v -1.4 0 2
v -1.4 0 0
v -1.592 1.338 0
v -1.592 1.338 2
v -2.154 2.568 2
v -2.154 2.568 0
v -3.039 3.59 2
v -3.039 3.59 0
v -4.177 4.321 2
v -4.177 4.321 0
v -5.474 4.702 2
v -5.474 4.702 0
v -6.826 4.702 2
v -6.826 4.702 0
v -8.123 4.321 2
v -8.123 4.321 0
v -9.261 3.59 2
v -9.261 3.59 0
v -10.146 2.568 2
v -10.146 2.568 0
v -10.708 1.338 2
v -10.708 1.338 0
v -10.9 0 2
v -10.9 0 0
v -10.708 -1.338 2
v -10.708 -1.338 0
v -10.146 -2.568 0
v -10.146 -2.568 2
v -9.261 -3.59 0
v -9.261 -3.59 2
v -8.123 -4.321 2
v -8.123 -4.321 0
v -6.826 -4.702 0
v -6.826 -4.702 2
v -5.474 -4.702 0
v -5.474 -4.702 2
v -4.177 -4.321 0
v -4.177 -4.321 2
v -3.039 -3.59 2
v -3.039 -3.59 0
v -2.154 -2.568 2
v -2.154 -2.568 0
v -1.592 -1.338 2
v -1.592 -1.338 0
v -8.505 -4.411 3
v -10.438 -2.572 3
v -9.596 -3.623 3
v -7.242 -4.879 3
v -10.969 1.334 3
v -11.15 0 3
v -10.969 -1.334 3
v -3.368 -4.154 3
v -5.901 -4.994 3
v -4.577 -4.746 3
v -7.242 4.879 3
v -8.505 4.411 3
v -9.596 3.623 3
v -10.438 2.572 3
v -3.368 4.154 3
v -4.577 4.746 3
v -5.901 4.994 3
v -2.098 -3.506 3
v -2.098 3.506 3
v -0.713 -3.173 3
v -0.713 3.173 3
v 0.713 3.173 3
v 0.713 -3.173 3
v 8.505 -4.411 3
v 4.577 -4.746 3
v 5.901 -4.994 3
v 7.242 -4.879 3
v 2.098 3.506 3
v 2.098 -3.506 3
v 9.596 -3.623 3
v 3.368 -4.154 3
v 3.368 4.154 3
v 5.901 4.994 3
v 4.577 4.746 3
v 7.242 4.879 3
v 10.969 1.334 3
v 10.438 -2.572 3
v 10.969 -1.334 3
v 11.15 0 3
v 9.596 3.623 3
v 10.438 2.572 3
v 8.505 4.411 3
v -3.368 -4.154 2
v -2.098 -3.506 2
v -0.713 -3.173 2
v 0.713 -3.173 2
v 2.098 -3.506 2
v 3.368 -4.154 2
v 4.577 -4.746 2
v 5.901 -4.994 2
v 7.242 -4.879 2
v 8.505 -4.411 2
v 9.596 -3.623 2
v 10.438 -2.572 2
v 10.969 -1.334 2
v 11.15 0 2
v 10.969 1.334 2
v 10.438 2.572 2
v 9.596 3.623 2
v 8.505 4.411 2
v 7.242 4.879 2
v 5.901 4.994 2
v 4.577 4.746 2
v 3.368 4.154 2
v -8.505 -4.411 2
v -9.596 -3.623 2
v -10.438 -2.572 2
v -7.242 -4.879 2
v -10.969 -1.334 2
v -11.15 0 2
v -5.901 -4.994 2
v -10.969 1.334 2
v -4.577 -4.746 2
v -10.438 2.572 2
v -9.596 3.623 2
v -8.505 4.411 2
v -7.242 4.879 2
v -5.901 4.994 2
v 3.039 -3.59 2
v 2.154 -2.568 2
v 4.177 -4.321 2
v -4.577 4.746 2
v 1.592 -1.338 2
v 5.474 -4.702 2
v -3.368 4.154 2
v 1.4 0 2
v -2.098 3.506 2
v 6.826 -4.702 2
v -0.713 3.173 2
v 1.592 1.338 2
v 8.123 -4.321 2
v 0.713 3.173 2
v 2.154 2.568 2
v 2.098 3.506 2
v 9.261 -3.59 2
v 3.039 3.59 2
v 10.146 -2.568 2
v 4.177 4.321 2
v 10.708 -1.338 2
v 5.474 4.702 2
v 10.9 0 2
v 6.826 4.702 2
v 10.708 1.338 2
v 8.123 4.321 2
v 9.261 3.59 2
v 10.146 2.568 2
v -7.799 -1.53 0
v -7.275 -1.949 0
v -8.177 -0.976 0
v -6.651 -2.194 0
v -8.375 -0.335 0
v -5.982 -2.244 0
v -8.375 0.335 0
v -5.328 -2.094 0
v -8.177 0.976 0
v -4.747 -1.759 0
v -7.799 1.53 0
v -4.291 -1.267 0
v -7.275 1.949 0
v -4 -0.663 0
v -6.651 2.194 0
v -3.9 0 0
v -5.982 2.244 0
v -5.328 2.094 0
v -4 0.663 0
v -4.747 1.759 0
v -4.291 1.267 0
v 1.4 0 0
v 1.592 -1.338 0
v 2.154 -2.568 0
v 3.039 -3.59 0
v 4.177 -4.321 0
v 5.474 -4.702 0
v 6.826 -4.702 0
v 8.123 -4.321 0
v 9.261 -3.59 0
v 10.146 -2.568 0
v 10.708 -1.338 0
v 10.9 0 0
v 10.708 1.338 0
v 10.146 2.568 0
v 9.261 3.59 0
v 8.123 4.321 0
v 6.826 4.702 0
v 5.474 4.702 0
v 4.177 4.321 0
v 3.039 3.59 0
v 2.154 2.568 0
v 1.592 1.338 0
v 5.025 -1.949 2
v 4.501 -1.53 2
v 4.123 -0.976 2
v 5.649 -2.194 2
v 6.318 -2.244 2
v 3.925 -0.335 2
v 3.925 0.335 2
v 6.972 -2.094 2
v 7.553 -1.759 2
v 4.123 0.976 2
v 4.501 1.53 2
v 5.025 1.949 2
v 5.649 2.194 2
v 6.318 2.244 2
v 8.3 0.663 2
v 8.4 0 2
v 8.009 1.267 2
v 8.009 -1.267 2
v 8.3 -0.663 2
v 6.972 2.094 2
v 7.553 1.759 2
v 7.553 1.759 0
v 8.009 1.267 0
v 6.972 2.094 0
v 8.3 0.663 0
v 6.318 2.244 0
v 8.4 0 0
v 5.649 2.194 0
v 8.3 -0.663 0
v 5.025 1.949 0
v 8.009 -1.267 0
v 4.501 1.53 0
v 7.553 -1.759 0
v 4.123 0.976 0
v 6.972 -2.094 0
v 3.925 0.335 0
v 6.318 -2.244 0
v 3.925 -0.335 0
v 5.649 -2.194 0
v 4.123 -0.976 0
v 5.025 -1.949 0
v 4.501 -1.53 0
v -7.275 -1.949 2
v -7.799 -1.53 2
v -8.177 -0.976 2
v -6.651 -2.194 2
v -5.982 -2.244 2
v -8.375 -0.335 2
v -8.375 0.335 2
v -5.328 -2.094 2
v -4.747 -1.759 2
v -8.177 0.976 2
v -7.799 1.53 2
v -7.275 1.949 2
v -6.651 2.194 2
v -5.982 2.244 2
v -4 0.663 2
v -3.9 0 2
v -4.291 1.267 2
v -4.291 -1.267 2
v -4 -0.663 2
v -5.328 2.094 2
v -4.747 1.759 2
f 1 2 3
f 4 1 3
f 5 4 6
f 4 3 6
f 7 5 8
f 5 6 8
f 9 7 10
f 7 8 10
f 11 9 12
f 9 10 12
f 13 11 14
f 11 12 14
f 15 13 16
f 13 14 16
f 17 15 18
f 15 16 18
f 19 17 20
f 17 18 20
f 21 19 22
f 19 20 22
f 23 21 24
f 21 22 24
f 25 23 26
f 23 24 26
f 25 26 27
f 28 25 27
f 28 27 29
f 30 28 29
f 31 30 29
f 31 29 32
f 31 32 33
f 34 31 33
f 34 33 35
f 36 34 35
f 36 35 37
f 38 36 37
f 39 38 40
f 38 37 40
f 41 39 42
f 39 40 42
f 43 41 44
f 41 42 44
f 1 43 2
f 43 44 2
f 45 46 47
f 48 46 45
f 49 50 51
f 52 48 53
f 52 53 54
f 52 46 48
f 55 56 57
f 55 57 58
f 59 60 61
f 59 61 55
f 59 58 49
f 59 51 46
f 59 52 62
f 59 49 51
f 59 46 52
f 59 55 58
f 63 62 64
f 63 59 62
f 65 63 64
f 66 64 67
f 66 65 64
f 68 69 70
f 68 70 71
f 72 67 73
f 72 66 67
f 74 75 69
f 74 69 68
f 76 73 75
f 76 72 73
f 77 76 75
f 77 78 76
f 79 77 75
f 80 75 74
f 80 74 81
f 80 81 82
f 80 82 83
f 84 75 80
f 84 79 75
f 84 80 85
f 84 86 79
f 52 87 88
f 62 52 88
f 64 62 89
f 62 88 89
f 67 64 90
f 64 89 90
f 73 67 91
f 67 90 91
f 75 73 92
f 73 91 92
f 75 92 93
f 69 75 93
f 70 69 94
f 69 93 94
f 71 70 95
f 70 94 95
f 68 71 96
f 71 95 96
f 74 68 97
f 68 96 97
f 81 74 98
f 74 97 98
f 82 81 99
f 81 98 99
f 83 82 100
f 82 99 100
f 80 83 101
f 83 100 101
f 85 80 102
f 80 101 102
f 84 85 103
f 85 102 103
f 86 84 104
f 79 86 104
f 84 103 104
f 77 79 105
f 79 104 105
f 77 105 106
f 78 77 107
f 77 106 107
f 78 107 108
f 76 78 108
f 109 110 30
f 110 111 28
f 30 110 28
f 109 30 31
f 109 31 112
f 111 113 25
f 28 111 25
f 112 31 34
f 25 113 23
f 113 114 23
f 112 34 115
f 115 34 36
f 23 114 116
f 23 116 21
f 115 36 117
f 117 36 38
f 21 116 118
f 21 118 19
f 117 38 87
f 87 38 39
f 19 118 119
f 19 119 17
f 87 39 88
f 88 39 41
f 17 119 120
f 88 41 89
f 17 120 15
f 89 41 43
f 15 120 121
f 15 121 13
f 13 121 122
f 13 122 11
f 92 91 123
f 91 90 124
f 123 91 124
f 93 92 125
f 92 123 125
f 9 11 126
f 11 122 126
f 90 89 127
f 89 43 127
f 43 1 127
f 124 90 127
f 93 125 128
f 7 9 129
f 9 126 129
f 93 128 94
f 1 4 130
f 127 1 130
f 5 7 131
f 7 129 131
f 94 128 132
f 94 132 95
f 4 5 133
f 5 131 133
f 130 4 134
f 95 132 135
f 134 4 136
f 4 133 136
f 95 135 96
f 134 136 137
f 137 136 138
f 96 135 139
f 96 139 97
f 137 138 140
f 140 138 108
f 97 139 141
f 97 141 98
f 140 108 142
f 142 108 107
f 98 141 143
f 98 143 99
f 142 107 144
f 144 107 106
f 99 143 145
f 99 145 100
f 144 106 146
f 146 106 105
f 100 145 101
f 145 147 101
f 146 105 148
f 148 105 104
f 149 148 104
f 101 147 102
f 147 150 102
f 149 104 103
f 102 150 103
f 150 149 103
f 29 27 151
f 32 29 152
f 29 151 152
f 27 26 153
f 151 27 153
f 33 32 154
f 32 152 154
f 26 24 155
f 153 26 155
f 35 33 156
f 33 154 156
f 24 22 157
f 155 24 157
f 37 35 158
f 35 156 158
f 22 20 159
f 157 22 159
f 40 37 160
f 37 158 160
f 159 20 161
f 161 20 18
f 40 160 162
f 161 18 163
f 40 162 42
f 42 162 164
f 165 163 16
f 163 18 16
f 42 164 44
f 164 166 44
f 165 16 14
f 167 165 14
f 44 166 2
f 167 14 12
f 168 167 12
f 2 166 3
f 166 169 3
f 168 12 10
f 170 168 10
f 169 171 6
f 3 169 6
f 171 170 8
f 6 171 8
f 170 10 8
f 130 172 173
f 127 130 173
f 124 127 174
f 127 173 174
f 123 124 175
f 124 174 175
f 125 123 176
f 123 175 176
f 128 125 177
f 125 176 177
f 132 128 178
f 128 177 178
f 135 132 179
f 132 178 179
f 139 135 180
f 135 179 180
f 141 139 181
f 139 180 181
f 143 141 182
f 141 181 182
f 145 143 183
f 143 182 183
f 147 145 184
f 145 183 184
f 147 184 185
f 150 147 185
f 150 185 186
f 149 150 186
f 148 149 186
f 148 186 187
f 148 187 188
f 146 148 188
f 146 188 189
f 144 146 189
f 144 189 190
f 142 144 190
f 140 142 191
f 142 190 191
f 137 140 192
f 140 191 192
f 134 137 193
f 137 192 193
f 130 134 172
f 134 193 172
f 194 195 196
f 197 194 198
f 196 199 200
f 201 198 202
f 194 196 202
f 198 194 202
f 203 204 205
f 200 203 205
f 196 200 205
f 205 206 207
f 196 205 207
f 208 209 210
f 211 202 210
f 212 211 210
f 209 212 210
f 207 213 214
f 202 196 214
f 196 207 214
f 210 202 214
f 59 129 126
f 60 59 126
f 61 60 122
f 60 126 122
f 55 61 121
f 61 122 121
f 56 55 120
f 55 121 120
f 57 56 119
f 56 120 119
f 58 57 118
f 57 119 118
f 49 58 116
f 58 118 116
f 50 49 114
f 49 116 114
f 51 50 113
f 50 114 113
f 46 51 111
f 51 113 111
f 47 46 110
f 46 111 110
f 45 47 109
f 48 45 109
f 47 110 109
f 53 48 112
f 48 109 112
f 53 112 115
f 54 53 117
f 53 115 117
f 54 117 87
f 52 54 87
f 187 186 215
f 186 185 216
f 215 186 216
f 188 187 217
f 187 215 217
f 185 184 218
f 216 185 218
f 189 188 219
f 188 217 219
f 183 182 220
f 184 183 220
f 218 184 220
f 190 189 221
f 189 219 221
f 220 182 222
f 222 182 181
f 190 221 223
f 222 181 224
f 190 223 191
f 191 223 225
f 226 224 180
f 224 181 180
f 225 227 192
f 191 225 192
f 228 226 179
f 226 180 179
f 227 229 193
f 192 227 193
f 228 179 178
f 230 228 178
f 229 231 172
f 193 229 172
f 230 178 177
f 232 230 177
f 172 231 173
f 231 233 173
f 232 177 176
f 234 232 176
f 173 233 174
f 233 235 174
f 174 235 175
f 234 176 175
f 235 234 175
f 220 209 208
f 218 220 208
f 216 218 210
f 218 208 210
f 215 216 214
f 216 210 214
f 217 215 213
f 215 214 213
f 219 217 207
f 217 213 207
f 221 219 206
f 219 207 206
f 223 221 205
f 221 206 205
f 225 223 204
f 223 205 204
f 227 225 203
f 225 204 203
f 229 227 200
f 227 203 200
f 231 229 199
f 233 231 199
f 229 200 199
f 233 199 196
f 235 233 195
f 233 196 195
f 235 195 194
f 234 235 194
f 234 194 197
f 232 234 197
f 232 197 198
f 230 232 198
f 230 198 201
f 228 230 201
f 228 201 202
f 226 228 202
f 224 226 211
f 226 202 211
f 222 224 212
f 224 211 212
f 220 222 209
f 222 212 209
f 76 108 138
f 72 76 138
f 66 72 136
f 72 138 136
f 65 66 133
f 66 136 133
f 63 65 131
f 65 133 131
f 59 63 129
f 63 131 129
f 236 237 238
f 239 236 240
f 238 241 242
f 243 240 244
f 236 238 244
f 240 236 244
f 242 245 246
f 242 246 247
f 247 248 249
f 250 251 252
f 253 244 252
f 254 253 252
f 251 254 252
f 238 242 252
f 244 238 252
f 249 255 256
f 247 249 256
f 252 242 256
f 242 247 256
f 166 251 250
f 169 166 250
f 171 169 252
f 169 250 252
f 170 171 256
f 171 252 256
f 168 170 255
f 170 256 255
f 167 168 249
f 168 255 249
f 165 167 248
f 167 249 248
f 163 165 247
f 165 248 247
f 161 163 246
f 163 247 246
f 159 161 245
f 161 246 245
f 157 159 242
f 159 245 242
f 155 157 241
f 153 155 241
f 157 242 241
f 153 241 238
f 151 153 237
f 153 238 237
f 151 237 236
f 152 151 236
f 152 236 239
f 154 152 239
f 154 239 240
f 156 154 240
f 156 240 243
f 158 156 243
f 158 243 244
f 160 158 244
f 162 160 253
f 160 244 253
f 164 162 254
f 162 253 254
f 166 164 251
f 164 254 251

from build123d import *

# Parameters (mm, degrees)
SKETCH1_R             = 4.75
BOSS_EXTRUDE1_DEPTH   = 2
BOSS_EXTRUDE1_2_DEPTH = 2
SKETCH2_R             = 2.25
CUT_EXTRUDE1_DEPTH    = 2
SKETCH2_4_R           = 2.25
CUT_EXTRUDE2_DEPTH    = 2
BOSS_EXTRUDE2_DEPTH   = 1


with BuildPart() as part:
    # Sketch1 → Boss-Extrude1 (new body)
    with BuildSketch(Plane.XY):
        with Locations((-6.15, 0)):
            Circle(SKETCH1_R)
    extrude(amount=BOSS_EXTRUDE1_DEPTH)

    # Sketch2 → Cut-Extrude1 (cut)
    with BuildSketch(Plane.XY.offset(2)):
        with Locations((-6.15, 0)):
            Circle(SKETCH2_R)
    extrude(amount=-CUT_EXTRUDE1_DEPTH, mode=Mode.SUBTRACT)



with BuildPart() as body_2:
    # Sketch1 → Boss-Extrude1 2 (new body)
    with BuildSketch(Plane.XY):
        with Locations((6.15, 0)):
            Circle(SKETCH1_R)
    extrude(amount=BOSS_EXTRUDE1_2_DEPTH)

    # Sketch2<4> → Cut-Extrude2 (cut)
    with BuildSketch(Plane.XY.offset(2)):
        with Locations((6.15, 0)):
            Circle(SKETCH2_4_R)
    extrude(amount=-CUT_EXTRUDE2_DEPTH, mode=Mode.SUBTRACT)


with BuildPart() as part_1:
    add(part.part)

    add(body_2.part)  # Boss-Extrude2 merges body 2
    # Sketch4 → Boss-Extrude2 (add)
    with BuildSketch(Plane.XY.offset(2)):
        with BuildLine():
            ThreePointArc((-3.367629676, 4.1543249), (-11.15, 3.6455e-05), (-3.367690254, -4.154365473))
            ThreePointArc((-3.367690254, -4.154365473), (0, -3.130814748), (3.367690254, -4.154365473))
            ThreePointArc((3.367690254, -4.154365473), (11.15, 3.6455e-05), (3.367629676, 4.1543249))
            ThreePointArc((3.367629676, 4.1543249), (0, 3.130765766), (-3.367629676, 4.1543249))
        make_face()
    extrude(amount=BOSS_EXTRUDE2_DEPTH)


solid = part_1.part
